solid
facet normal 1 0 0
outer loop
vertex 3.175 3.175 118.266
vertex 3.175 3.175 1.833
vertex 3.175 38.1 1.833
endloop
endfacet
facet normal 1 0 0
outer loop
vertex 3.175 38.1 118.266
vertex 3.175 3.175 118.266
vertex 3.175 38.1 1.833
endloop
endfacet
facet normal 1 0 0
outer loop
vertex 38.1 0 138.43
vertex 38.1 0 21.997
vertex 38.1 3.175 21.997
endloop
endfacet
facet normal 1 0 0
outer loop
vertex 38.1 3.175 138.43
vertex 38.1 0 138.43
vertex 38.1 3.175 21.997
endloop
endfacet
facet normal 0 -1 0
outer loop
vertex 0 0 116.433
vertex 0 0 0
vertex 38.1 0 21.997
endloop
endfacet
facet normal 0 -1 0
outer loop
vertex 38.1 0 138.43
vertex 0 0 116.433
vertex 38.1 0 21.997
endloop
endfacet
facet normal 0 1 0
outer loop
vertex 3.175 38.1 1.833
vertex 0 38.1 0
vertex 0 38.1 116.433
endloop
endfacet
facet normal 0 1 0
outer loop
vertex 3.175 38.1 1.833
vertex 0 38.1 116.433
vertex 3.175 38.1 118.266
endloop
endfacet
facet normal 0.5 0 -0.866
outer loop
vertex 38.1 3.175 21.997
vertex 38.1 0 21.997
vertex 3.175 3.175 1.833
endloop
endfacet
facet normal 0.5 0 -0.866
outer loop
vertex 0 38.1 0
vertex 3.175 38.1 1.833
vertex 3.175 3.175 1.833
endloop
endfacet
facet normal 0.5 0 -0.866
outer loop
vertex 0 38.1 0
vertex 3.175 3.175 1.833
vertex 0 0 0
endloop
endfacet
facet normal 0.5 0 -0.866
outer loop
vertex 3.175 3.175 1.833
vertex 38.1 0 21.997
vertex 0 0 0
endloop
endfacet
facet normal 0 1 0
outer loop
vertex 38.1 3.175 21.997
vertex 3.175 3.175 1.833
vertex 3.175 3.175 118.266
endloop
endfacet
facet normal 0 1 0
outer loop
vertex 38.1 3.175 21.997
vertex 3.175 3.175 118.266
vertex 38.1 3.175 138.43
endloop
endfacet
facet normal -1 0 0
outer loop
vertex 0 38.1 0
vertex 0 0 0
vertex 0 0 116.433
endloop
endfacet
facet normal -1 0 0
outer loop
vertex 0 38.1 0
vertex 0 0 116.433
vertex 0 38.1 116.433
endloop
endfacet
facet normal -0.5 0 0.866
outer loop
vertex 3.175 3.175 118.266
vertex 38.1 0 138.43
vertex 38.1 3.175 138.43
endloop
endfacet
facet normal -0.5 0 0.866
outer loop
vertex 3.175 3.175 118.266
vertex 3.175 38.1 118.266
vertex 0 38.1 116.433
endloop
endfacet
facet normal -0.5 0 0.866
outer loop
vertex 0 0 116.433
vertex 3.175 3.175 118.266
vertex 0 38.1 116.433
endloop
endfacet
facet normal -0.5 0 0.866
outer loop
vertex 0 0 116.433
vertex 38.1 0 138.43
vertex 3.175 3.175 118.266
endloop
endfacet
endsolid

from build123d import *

# Parameters (mm, degrees)
SKETCH1_W           = 38.1
SKETCH1_H           = 38.1
BOSS_EXTRUDE1_DEPTH = 138.43
SKETCH2_W           = 34.925
SKETCH2_H           = 34.925
CUT_EXTRUDE1_DEPTH  = 139.43
CUT_EXTRUDE2_DEPTH  = 38.1


with BuildPart() as part:
    # Sketch1 → Boss-Extrude1 (new body)
    with BuildSketch(Plane.XY):
        with Locations((19.05, 19.05)):
            Rectangle(SKETCH1_W, SKETCH1_H)
    extrude(amount=BOSS_EXTRUDE1_DEPTH)

    # Sketch2 → Cut-Extrude1 (cut, through all)
    with BuildSketch(Plane.XY.offset(138.43)):
        with Locations((20.6375, 20.6375)):
            Rectangle(SKETCH2_W, SKETCH2_H)
    extrude(amount=-CUT_EXTRUDE1_DEPTH, mode=Mode.SUBTRACT)

    # Sketch3 → Cut-Extrude2 (cut)
    with BuildSketch(Plane(origin=(0, 0, 0), x_dir=(-1, 0, 0), z_dir=(0, -1, 0))):
        Polygon((0, 0), (-38.1, 0), (-38.1, -21.997045256), align=None)
        Polygon((0, -138.43), (-38.1, -138.43), (0, -116.432954744), align=None)
    extrude(amount=-CUT_EXTRUDE2_DEPTH, mode=Mode.SUBTRACT)


solid = part.part
